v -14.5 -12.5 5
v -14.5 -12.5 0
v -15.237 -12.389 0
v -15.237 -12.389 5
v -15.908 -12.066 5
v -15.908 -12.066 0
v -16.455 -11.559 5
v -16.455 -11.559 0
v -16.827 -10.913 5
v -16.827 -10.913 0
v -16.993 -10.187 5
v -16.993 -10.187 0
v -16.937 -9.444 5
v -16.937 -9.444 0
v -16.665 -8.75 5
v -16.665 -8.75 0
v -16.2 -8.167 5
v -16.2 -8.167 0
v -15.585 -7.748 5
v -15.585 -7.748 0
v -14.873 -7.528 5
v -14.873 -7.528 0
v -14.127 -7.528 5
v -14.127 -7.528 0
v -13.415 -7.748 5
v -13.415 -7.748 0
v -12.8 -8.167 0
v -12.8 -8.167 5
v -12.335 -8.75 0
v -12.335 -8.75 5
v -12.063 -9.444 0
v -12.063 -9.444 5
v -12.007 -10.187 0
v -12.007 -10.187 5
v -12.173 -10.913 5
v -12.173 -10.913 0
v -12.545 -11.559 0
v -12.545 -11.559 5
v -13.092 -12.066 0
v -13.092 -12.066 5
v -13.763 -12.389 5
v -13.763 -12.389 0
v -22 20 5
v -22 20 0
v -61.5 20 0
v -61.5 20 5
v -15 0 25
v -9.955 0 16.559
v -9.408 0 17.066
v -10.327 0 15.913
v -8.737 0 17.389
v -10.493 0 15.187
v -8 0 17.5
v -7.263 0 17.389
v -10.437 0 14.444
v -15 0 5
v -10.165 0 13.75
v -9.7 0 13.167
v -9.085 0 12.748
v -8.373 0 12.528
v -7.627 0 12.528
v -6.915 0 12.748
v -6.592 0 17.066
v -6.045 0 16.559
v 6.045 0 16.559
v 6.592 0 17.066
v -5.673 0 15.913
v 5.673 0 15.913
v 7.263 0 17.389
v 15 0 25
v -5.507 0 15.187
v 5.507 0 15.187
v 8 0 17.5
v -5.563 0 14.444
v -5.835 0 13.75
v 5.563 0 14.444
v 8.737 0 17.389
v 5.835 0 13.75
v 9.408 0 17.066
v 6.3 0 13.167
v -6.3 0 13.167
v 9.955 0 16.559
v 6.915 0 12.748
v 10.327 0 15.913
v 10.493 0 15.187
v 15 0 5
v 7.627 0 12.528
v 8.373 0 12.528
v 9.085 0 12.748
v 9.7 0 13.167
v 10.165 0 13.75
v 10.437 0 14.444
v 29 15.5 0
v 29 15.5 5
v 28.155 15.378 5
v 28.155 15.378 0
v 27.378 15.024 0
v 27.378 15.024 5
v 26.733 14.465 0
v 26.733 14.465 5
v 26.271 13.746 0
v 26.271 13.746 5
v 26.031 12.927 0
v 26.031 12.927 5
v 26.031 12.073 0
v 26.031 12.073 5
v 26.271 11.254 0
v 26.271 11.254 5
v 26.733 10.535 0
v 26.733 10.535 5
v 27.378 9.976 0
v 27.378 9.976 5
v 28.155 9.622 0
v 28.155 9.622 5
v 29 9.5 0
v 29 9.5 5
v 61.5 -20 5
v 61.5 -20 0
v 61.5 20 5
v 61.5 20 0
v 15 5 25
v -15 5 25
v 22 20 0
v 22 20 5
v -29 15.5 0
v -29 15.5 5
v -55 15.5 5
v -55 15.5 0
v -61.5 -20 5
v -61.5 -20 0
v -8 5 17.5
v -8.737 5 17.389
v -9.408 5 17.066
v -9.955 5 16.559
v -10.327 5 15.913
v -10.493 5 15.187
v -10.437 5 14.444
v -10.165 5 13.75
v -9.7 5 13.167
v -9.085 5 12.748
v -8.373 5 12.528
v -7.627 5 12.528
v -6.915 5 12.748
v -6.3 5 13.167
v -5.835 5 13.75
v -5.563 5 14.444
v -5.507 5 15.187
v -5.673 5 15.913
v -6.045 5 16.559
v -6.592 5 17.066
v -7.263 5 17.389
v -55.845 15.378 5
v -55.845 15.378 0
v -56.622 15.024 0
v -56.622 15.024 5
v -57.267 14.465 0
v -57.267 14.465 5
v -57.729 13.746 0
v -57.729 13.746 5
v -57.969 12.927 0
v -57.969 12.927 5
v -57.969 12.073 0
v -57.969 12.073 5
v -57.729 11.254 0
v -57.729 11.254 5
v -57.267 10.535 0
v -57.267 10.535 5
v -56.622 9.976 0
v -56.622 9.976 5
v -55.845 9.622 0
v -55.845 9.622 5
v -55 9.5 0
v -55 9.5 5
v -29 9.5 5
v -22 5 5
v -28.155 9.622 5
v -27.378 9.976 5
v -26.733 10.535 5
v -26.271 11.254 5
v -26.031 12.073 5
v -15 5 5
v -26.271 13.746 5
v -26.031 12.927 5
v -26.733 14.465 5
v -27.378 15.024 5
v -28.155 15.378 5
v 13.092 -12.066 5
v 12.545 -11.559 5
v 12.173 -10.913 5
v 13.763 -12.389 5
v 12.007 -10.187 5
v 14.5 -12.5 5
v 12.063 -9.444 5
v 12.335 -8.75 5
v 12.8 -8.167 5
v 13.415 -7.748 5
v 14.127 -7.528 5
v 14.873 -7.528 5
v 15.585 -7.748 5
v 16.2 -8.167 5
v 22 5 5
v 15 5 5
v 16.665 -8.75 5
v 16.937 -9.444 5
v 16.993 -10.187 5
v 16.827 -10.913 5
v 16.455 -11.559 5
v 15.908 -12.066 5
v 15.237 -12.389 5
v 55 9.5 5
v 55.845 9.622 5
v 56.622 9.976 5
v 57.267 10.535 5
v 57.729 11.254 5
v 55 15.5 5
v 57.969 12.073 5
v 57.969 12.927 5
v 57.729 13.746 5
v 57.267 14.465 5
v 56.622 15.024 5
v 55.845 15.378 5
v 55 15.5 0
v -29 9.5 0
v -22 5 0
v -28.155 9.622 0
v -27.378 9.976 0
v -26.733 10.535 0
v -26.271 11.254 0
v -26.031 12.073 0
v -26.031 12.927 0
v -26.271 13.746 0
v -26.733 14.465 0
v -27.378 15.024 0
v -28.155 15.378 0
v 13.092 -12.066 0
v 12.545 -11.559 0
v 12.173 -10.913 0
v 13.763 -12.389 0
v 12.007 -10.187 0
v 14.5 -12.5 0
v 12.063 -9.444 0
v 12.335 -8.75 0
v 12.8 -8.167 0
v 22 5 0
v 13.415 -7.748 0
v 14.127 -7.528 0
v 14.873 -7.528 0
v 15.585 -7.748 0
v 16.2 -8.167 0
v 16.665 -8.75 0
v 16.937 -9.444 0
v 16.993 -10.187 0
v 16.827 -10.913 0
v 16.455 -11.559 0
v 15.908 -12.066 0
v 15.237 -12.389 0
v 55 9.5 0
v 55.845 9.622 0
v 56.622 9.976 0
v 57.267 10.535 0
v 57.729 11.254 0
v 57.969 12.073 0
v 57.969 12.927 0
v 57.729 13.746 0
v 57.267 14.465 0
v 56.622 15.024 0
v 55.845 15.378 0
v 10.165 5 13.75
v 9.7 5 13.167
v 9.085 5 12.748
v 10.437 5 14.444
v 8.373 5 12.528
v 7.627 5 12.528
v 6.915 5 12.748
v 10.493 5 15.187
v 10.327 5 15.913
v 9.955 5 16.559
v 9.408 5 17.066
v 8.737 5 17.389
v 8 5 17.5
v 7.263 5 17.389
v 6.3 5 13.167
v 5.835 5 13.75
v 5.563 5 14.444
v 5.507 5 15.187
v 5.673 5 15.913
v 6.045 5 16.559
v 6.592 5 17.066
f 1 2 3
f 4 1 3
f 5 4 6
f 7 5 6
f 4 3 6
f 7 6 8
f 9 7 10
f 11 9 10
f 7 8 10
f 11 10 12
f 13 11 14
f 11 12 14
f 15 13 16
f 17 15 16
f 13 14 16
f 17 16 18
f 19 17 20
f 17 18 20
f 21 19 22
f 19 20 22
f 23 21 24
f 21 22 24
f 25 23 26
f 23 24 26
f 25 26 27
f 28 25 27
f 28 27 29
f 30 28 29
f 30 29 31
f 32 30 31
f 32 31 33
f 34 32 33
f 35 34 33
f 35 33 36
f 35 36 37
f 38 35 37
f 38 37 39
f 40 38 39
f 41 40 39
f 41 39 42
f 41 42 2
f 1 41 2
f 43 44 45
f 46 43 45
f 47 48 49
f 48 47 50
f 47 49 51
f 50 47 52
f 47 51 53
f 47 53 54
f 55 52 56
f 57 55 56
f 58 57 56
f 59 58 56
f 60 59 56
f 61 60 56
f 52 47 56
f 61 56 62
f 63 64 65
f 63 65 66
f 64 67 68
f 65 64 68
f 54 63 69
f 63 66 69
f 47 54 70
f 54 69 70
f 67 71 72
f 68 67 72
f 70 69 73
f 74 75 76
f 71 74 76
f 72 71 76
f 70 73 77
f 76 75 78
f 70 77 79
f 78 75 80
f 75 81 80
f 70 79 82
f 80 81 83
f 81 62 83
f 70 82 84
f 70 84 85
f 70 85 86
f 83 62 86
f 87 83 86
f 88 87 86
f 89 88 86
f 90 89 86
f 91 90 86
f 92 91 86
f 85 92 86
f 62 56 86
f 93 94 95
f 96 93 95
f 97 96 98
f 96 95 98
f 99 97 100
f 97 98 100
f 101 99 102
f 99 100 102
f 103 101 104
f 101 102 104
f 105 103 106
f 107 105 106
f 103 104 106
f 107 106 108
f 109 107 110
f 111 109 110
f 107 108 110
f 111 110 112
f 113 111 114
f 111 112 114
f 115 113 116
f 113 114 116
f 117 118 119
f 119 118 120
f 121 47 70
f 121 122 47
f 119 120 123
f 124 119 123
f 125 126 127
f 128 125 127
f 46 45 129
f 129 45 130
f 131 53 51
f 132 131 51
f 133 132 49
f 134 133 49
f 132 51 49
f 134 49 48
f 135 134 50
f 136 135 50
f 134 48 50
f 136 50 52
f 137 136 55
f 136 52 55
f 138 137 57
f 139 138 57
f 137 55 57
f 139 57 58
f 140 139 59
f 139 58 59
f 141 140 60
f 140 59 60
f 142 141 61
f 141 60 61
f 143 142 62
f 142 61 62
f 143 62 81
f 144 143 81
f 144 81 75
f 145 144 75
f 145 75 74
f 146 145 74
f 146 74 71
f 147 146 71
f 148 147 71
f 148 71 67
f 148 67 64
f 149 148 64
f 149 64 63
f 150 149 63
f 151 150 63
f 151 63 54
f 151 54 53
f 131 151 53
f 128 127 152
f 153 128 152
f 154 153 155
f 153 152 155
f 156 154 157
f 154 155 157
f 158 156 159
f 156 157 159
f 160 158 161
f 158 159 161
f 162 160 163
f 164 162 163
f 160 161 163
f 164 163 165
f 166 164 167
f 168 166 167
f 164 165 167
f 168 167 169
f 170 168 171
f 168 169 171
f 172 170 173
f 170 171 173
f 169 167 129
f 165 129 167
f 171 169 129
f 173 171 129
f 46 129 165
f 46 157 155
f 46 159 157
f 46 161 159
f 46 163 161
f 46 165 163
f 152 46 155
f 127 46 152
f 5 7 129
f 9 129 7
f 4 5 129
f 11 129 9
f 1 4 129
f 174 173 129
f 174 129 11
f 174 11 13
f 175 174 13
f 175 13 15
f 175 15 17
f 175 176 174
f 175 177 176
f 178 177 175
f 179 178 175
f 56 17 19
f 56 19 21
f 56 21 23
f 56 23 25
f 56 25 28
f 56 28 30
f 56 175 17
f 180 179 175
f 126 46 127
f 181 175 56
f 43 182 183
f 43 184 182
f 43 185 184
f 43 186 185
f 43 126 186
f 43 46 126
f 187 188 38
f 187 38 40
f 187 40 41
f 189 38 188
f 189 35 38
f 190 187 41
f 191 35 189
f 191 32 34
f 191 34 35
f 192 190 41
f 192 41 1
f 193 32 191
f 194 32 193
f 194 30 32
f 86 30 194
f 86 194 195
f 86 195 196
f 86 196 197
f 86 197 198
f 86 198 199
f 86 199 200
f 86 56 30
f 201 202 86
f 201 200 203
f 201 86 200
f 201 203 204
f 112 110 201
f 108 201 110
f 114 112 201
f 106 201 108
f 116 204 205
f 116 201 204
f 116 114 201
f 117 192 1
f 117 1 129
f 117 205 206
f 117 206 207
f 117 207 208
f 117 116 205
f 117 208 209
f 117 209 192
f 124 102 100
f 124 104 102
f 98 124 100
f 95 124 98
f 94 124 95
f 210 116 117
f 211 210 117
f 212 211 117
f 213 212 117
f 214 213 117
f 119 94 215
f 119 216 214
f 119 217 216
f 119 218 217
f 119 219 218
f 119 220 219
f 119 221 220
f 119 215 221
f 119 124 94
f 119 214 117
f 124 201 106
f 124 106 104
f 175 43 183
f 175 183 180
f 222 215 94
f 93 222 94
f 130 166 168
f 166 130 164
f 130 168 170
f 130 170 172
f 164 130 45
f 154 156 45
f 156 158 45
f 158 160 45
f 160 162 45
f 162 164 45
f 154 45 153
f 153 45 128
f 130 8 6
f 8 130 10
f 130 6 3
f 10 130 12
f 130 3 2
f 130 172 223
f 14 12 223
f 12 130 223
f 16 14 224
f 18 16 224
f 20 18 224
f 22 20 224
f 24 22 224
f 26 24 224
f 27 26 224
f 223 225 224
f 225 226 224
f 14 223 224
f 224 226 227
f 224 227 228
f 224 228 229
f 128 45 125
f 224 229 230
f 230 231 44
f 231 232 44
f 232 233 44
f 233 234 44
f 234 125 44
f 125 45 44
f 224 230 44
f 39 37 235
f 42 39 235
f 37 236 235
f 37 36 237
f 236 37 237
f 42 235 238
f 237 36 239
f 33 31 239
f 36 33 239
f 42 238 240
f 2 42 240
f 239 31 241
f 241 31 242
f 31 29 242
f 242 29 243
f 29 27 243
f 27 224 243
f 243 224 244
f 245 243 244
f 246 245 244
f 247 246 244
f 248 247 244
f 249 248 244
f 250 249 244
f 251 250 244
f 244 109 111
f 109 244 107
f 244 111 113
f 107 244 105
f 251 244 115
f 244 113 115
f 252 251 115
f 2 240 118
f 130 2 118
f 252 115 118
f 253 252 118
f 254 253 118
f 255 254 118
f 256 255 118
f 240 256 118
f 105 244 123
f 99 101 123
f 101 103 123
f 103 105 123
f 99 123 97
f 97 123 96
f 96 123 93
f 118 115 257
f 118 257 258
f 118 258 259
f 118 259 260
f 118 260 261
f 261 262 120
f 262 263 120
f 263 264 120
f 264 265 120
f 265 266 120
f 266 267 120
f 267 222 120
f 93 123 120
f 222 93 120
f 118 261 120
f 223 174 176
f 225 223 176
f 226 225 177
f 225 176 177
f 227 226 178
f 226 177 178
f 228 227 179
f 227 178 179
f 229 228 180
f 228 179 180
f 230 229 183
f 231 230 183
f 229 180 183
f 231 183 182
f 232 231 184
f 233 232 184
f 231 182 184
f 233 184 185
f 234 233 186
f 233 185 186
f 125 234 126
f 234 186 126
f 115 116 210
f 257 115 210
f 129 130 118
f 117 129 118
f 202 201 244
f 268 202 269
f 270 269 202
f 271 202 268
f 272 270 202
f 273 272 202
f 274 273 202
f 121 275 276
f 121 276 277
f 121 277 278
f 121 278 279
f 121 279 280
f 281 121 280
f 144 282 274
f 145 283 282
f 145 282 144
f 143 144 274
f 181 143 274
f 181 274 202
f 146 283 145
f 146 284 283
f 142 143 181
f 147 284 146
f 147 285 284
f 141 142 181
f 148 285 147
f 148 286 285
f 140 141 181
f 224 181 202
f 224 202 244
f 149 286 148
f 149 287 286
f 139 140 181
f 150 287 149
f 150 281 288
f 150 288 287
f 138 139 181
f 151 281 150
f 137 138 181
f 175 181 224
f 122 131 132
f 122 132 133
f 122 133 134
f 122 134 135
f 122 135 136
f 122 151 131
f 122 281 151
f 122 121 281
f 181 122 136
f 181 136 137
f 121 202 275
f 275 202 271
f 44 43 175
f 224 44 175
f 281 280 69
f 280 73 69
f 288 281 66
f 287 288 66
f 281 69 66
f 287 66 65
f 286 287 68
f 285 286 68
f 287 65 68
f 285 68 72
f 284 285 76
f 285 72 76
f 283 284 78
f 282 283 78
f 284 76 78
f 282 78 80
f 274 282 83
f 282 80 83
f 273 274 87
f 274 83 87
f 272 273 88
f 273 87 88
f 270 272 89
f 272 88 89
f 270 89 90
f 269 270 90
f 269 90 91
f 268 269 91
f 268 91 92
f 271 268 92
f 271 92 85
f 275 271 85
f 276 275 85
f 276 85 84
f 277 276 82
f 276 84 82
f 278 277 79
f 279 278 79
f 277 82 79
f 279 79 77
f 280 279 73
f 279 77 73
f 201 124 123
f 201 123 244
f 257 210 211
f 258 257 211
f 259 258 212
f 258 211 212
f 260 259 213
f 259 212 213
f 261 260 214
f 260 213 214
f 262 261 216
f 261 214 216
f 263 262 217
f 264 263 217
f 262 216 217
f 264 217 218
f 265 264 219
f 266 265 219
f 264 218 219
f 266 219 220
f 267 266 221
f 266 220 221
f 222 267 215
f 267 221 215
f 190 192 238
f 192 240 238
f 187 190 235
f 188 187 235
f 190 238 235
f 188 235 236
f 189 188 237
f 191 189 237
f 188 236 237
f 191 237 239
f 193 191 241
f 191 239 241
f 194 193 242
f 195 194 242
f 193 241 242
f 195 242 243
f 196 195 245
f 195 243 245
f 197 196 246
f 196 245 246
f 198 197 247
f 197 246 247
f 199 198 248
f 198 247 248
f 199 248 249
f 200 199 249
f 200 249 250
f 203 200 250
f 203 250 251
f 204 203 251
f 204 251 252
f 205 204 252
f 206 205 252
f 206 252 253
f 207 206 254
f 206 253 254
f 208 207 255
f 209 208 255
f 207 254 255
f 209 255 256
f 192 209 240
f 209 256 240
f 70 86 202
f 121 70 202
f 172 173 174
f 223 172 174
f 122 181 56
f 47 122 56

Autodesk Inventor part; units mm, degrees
ref_plane "YZ Plane" through (0, 0, 0) normal (1, 0, 0) x (0, 1, 0)
ref_plane "XZ Plane" through (0, 0, 0) normal (0, 1, 0) x (-1, 0, 0)
ref_plane "XY Plane" through (0, 0, 0) normal (0, 0, 1) x (1, 0, 0)
sketch "スケッチ1" plane through (0, 0, 0) normal (0, 0, 1) x (1, 0, 0)
  line L0 (-61.5, -20) -> (61.5, -20)
  line L1 (61.5, -20) -> (61.5, 20)
  line L2 (61.5, 20) -> (-61.5, 20)
  line L3 (-61.5, 20) -> (-61.5, -20)
  line L4 (-61.5, -20) -> (61.5, 20) construction
  line L5 (61.5, -20) -> (-61.5, 20) construction
  point P0 (0, 0)
  dimension "d0" = 123
  dimension "d1" = 40
extrude "押し出し1" add sketch "スケッチ1" along normal blind 5
sketch "スケッチ2" plane through (0, 0, 5) normal (0, 0, 1) x (1, 0, 0)
  line L0 (61.5, 20) -> (-61.5, 20) projected
  line L1 (0, 20) -> (22, 20)
  line L2 (22, 20) -> (22, 5)
  line L3 (22, 5) -> (0, 5)
  line L4 (0, 5) -> (0, 20)
  line L5 (0, 20) -> (-22, 20)
  line L6 (-22, 20) -> (-22, 5)
  line L7 (-22, 5) -> (0, 5)
  line L8 (0, 5) -> (0, 20)
  point P0 (0, 0)
  dimension "d4" = 22
  dimension "d5" = 15
  dimension "d6" = 22
extrude "押し出し2" cut sketch "スケッチ2" against normal blind 5
sketch "スケッチ3" plane through (0, 0, 5) normal (0, 0, 1) x (1, 0, 0)
  line L0 (61.5, 20) -> (22, 20) projected
  line L1 (-22, 5) -> (-22, 20) projected
  line L2 (22, 20) -> (22, 5) projected
  line L3 (-29, 12.5) -> (-55, 12.5) construction
  line L4 (-29, 15.5) -> (-55, 15.5)
  line L5 (-55, 9.5) -> (-29, 9.5)
  arc A0 (-29, 9.5) -> (-29, 15.5) centre (-29, 12.5) ccw
  arc A1 (-55, 15.5) -> (-55, 9.5) centre (-55, 12.5) ccw
  line L6 (55, 12.5) -> (29, 12.5) construction
  line L7 (55, 15.5) -> (29, 15.5)
  line L8 (29, 9.5) -> (55, 9.5)
  arc A2 (55, 9.5) -> (55, 15.5) centre (55, 12.5) ccw
  arc A3 (29, 15.5) -> (29, 9.5) centre (29, 12.5) ccw
  point P0 (0, 0)
  point P1 (42, 12.5)
  point P2 (-42, 12.5)
  dimension "d9" = 7.5
  dimension "d10" = 20
  dimension "d11" = 20
  dimension "d12" = 32
  dimension "d13" = 6
  dimension "d14" = 32
  dimension "d15" = 6
extrude "押し出し3" cut sketch "スケッチ3" against normal blind 5
sketch "スケッチ4" plane through (0, 0, 5) normal (0, 0, 1) x (1, 0, 0)
  line L0 (-61.5, -20) -> (61.5, -20) projected
  line L1 (61.5, -20) -> (61.5, 20) projected
  line L2 (-61.5, 20) -> (-61.5, -20) projected
  point P0 (0, 0)
  point P1 (14.5, -10)
  point P2 (-14.5, -10)
  dimension "d18" = 10
  dimension "d19" = 47
  dimension "d20" = 47
  dimension "d21" = 10
hole "穴1" at (14.5, -10, 5) at (-14.5, -10, 5) direction (0, 0, -1) diameter 5 depth 8.8 tip angle 118
sketch "スケッチ5" plane through (0, 0, 5) normal (0, 0, 1) x (1, 0, 0)
  line L0 (-22, 5) -> (22, 5) projected
  line L1 (0, 5) -> (-15, 5)
  line L2 (-15, 5) -> (-15, 0)
  line L3 (-15, 0) -> (0, 0)
  line L4 (0, 0) -> (0, 5)
  line L5 (0, 0) -> (15, 0)
  line L6 (15, 0) -> (15, 5)
  line L7 (15, 5) -> (0, 5)
  line L8 (0, 5) -> (0, 0)
  point P0 (0, 0)
  dimension "d29" = 15
  dimension "d30" = 15
extrude "押し出し4" add sketch "スケッチ5" along normal blind 20
sketch "スケッチ6" plane through (-15, 0, 5) normal (0, -1, 0) x (1, 0, 0)
  point P0 (15, -5)
sketch "スケッチ7" plane through (-22, 5, 0) normal (0, 1, 0) x (1, 0, 0)
  line L0 (37, -25) -> (7, -25) projected
  line L1 (37, -5) -> (37, -25) projected
  line L2 (7, -5) -> (7, -25) projected
  point P0 (22, 0)
  point P1 (30, -15)
  point P2 (14, -15)
  dimension "d33" = 10
  dimension "d34" = 10
  dimension "d35" = 7
  dimension "d36" = 7
hole "穴2" at (8, 5, 15) at (-8, 5, 15) direction (0, -1, 0) diameter 5 depth 8.8 tip angle 118
properties part number "20230309gamma"
